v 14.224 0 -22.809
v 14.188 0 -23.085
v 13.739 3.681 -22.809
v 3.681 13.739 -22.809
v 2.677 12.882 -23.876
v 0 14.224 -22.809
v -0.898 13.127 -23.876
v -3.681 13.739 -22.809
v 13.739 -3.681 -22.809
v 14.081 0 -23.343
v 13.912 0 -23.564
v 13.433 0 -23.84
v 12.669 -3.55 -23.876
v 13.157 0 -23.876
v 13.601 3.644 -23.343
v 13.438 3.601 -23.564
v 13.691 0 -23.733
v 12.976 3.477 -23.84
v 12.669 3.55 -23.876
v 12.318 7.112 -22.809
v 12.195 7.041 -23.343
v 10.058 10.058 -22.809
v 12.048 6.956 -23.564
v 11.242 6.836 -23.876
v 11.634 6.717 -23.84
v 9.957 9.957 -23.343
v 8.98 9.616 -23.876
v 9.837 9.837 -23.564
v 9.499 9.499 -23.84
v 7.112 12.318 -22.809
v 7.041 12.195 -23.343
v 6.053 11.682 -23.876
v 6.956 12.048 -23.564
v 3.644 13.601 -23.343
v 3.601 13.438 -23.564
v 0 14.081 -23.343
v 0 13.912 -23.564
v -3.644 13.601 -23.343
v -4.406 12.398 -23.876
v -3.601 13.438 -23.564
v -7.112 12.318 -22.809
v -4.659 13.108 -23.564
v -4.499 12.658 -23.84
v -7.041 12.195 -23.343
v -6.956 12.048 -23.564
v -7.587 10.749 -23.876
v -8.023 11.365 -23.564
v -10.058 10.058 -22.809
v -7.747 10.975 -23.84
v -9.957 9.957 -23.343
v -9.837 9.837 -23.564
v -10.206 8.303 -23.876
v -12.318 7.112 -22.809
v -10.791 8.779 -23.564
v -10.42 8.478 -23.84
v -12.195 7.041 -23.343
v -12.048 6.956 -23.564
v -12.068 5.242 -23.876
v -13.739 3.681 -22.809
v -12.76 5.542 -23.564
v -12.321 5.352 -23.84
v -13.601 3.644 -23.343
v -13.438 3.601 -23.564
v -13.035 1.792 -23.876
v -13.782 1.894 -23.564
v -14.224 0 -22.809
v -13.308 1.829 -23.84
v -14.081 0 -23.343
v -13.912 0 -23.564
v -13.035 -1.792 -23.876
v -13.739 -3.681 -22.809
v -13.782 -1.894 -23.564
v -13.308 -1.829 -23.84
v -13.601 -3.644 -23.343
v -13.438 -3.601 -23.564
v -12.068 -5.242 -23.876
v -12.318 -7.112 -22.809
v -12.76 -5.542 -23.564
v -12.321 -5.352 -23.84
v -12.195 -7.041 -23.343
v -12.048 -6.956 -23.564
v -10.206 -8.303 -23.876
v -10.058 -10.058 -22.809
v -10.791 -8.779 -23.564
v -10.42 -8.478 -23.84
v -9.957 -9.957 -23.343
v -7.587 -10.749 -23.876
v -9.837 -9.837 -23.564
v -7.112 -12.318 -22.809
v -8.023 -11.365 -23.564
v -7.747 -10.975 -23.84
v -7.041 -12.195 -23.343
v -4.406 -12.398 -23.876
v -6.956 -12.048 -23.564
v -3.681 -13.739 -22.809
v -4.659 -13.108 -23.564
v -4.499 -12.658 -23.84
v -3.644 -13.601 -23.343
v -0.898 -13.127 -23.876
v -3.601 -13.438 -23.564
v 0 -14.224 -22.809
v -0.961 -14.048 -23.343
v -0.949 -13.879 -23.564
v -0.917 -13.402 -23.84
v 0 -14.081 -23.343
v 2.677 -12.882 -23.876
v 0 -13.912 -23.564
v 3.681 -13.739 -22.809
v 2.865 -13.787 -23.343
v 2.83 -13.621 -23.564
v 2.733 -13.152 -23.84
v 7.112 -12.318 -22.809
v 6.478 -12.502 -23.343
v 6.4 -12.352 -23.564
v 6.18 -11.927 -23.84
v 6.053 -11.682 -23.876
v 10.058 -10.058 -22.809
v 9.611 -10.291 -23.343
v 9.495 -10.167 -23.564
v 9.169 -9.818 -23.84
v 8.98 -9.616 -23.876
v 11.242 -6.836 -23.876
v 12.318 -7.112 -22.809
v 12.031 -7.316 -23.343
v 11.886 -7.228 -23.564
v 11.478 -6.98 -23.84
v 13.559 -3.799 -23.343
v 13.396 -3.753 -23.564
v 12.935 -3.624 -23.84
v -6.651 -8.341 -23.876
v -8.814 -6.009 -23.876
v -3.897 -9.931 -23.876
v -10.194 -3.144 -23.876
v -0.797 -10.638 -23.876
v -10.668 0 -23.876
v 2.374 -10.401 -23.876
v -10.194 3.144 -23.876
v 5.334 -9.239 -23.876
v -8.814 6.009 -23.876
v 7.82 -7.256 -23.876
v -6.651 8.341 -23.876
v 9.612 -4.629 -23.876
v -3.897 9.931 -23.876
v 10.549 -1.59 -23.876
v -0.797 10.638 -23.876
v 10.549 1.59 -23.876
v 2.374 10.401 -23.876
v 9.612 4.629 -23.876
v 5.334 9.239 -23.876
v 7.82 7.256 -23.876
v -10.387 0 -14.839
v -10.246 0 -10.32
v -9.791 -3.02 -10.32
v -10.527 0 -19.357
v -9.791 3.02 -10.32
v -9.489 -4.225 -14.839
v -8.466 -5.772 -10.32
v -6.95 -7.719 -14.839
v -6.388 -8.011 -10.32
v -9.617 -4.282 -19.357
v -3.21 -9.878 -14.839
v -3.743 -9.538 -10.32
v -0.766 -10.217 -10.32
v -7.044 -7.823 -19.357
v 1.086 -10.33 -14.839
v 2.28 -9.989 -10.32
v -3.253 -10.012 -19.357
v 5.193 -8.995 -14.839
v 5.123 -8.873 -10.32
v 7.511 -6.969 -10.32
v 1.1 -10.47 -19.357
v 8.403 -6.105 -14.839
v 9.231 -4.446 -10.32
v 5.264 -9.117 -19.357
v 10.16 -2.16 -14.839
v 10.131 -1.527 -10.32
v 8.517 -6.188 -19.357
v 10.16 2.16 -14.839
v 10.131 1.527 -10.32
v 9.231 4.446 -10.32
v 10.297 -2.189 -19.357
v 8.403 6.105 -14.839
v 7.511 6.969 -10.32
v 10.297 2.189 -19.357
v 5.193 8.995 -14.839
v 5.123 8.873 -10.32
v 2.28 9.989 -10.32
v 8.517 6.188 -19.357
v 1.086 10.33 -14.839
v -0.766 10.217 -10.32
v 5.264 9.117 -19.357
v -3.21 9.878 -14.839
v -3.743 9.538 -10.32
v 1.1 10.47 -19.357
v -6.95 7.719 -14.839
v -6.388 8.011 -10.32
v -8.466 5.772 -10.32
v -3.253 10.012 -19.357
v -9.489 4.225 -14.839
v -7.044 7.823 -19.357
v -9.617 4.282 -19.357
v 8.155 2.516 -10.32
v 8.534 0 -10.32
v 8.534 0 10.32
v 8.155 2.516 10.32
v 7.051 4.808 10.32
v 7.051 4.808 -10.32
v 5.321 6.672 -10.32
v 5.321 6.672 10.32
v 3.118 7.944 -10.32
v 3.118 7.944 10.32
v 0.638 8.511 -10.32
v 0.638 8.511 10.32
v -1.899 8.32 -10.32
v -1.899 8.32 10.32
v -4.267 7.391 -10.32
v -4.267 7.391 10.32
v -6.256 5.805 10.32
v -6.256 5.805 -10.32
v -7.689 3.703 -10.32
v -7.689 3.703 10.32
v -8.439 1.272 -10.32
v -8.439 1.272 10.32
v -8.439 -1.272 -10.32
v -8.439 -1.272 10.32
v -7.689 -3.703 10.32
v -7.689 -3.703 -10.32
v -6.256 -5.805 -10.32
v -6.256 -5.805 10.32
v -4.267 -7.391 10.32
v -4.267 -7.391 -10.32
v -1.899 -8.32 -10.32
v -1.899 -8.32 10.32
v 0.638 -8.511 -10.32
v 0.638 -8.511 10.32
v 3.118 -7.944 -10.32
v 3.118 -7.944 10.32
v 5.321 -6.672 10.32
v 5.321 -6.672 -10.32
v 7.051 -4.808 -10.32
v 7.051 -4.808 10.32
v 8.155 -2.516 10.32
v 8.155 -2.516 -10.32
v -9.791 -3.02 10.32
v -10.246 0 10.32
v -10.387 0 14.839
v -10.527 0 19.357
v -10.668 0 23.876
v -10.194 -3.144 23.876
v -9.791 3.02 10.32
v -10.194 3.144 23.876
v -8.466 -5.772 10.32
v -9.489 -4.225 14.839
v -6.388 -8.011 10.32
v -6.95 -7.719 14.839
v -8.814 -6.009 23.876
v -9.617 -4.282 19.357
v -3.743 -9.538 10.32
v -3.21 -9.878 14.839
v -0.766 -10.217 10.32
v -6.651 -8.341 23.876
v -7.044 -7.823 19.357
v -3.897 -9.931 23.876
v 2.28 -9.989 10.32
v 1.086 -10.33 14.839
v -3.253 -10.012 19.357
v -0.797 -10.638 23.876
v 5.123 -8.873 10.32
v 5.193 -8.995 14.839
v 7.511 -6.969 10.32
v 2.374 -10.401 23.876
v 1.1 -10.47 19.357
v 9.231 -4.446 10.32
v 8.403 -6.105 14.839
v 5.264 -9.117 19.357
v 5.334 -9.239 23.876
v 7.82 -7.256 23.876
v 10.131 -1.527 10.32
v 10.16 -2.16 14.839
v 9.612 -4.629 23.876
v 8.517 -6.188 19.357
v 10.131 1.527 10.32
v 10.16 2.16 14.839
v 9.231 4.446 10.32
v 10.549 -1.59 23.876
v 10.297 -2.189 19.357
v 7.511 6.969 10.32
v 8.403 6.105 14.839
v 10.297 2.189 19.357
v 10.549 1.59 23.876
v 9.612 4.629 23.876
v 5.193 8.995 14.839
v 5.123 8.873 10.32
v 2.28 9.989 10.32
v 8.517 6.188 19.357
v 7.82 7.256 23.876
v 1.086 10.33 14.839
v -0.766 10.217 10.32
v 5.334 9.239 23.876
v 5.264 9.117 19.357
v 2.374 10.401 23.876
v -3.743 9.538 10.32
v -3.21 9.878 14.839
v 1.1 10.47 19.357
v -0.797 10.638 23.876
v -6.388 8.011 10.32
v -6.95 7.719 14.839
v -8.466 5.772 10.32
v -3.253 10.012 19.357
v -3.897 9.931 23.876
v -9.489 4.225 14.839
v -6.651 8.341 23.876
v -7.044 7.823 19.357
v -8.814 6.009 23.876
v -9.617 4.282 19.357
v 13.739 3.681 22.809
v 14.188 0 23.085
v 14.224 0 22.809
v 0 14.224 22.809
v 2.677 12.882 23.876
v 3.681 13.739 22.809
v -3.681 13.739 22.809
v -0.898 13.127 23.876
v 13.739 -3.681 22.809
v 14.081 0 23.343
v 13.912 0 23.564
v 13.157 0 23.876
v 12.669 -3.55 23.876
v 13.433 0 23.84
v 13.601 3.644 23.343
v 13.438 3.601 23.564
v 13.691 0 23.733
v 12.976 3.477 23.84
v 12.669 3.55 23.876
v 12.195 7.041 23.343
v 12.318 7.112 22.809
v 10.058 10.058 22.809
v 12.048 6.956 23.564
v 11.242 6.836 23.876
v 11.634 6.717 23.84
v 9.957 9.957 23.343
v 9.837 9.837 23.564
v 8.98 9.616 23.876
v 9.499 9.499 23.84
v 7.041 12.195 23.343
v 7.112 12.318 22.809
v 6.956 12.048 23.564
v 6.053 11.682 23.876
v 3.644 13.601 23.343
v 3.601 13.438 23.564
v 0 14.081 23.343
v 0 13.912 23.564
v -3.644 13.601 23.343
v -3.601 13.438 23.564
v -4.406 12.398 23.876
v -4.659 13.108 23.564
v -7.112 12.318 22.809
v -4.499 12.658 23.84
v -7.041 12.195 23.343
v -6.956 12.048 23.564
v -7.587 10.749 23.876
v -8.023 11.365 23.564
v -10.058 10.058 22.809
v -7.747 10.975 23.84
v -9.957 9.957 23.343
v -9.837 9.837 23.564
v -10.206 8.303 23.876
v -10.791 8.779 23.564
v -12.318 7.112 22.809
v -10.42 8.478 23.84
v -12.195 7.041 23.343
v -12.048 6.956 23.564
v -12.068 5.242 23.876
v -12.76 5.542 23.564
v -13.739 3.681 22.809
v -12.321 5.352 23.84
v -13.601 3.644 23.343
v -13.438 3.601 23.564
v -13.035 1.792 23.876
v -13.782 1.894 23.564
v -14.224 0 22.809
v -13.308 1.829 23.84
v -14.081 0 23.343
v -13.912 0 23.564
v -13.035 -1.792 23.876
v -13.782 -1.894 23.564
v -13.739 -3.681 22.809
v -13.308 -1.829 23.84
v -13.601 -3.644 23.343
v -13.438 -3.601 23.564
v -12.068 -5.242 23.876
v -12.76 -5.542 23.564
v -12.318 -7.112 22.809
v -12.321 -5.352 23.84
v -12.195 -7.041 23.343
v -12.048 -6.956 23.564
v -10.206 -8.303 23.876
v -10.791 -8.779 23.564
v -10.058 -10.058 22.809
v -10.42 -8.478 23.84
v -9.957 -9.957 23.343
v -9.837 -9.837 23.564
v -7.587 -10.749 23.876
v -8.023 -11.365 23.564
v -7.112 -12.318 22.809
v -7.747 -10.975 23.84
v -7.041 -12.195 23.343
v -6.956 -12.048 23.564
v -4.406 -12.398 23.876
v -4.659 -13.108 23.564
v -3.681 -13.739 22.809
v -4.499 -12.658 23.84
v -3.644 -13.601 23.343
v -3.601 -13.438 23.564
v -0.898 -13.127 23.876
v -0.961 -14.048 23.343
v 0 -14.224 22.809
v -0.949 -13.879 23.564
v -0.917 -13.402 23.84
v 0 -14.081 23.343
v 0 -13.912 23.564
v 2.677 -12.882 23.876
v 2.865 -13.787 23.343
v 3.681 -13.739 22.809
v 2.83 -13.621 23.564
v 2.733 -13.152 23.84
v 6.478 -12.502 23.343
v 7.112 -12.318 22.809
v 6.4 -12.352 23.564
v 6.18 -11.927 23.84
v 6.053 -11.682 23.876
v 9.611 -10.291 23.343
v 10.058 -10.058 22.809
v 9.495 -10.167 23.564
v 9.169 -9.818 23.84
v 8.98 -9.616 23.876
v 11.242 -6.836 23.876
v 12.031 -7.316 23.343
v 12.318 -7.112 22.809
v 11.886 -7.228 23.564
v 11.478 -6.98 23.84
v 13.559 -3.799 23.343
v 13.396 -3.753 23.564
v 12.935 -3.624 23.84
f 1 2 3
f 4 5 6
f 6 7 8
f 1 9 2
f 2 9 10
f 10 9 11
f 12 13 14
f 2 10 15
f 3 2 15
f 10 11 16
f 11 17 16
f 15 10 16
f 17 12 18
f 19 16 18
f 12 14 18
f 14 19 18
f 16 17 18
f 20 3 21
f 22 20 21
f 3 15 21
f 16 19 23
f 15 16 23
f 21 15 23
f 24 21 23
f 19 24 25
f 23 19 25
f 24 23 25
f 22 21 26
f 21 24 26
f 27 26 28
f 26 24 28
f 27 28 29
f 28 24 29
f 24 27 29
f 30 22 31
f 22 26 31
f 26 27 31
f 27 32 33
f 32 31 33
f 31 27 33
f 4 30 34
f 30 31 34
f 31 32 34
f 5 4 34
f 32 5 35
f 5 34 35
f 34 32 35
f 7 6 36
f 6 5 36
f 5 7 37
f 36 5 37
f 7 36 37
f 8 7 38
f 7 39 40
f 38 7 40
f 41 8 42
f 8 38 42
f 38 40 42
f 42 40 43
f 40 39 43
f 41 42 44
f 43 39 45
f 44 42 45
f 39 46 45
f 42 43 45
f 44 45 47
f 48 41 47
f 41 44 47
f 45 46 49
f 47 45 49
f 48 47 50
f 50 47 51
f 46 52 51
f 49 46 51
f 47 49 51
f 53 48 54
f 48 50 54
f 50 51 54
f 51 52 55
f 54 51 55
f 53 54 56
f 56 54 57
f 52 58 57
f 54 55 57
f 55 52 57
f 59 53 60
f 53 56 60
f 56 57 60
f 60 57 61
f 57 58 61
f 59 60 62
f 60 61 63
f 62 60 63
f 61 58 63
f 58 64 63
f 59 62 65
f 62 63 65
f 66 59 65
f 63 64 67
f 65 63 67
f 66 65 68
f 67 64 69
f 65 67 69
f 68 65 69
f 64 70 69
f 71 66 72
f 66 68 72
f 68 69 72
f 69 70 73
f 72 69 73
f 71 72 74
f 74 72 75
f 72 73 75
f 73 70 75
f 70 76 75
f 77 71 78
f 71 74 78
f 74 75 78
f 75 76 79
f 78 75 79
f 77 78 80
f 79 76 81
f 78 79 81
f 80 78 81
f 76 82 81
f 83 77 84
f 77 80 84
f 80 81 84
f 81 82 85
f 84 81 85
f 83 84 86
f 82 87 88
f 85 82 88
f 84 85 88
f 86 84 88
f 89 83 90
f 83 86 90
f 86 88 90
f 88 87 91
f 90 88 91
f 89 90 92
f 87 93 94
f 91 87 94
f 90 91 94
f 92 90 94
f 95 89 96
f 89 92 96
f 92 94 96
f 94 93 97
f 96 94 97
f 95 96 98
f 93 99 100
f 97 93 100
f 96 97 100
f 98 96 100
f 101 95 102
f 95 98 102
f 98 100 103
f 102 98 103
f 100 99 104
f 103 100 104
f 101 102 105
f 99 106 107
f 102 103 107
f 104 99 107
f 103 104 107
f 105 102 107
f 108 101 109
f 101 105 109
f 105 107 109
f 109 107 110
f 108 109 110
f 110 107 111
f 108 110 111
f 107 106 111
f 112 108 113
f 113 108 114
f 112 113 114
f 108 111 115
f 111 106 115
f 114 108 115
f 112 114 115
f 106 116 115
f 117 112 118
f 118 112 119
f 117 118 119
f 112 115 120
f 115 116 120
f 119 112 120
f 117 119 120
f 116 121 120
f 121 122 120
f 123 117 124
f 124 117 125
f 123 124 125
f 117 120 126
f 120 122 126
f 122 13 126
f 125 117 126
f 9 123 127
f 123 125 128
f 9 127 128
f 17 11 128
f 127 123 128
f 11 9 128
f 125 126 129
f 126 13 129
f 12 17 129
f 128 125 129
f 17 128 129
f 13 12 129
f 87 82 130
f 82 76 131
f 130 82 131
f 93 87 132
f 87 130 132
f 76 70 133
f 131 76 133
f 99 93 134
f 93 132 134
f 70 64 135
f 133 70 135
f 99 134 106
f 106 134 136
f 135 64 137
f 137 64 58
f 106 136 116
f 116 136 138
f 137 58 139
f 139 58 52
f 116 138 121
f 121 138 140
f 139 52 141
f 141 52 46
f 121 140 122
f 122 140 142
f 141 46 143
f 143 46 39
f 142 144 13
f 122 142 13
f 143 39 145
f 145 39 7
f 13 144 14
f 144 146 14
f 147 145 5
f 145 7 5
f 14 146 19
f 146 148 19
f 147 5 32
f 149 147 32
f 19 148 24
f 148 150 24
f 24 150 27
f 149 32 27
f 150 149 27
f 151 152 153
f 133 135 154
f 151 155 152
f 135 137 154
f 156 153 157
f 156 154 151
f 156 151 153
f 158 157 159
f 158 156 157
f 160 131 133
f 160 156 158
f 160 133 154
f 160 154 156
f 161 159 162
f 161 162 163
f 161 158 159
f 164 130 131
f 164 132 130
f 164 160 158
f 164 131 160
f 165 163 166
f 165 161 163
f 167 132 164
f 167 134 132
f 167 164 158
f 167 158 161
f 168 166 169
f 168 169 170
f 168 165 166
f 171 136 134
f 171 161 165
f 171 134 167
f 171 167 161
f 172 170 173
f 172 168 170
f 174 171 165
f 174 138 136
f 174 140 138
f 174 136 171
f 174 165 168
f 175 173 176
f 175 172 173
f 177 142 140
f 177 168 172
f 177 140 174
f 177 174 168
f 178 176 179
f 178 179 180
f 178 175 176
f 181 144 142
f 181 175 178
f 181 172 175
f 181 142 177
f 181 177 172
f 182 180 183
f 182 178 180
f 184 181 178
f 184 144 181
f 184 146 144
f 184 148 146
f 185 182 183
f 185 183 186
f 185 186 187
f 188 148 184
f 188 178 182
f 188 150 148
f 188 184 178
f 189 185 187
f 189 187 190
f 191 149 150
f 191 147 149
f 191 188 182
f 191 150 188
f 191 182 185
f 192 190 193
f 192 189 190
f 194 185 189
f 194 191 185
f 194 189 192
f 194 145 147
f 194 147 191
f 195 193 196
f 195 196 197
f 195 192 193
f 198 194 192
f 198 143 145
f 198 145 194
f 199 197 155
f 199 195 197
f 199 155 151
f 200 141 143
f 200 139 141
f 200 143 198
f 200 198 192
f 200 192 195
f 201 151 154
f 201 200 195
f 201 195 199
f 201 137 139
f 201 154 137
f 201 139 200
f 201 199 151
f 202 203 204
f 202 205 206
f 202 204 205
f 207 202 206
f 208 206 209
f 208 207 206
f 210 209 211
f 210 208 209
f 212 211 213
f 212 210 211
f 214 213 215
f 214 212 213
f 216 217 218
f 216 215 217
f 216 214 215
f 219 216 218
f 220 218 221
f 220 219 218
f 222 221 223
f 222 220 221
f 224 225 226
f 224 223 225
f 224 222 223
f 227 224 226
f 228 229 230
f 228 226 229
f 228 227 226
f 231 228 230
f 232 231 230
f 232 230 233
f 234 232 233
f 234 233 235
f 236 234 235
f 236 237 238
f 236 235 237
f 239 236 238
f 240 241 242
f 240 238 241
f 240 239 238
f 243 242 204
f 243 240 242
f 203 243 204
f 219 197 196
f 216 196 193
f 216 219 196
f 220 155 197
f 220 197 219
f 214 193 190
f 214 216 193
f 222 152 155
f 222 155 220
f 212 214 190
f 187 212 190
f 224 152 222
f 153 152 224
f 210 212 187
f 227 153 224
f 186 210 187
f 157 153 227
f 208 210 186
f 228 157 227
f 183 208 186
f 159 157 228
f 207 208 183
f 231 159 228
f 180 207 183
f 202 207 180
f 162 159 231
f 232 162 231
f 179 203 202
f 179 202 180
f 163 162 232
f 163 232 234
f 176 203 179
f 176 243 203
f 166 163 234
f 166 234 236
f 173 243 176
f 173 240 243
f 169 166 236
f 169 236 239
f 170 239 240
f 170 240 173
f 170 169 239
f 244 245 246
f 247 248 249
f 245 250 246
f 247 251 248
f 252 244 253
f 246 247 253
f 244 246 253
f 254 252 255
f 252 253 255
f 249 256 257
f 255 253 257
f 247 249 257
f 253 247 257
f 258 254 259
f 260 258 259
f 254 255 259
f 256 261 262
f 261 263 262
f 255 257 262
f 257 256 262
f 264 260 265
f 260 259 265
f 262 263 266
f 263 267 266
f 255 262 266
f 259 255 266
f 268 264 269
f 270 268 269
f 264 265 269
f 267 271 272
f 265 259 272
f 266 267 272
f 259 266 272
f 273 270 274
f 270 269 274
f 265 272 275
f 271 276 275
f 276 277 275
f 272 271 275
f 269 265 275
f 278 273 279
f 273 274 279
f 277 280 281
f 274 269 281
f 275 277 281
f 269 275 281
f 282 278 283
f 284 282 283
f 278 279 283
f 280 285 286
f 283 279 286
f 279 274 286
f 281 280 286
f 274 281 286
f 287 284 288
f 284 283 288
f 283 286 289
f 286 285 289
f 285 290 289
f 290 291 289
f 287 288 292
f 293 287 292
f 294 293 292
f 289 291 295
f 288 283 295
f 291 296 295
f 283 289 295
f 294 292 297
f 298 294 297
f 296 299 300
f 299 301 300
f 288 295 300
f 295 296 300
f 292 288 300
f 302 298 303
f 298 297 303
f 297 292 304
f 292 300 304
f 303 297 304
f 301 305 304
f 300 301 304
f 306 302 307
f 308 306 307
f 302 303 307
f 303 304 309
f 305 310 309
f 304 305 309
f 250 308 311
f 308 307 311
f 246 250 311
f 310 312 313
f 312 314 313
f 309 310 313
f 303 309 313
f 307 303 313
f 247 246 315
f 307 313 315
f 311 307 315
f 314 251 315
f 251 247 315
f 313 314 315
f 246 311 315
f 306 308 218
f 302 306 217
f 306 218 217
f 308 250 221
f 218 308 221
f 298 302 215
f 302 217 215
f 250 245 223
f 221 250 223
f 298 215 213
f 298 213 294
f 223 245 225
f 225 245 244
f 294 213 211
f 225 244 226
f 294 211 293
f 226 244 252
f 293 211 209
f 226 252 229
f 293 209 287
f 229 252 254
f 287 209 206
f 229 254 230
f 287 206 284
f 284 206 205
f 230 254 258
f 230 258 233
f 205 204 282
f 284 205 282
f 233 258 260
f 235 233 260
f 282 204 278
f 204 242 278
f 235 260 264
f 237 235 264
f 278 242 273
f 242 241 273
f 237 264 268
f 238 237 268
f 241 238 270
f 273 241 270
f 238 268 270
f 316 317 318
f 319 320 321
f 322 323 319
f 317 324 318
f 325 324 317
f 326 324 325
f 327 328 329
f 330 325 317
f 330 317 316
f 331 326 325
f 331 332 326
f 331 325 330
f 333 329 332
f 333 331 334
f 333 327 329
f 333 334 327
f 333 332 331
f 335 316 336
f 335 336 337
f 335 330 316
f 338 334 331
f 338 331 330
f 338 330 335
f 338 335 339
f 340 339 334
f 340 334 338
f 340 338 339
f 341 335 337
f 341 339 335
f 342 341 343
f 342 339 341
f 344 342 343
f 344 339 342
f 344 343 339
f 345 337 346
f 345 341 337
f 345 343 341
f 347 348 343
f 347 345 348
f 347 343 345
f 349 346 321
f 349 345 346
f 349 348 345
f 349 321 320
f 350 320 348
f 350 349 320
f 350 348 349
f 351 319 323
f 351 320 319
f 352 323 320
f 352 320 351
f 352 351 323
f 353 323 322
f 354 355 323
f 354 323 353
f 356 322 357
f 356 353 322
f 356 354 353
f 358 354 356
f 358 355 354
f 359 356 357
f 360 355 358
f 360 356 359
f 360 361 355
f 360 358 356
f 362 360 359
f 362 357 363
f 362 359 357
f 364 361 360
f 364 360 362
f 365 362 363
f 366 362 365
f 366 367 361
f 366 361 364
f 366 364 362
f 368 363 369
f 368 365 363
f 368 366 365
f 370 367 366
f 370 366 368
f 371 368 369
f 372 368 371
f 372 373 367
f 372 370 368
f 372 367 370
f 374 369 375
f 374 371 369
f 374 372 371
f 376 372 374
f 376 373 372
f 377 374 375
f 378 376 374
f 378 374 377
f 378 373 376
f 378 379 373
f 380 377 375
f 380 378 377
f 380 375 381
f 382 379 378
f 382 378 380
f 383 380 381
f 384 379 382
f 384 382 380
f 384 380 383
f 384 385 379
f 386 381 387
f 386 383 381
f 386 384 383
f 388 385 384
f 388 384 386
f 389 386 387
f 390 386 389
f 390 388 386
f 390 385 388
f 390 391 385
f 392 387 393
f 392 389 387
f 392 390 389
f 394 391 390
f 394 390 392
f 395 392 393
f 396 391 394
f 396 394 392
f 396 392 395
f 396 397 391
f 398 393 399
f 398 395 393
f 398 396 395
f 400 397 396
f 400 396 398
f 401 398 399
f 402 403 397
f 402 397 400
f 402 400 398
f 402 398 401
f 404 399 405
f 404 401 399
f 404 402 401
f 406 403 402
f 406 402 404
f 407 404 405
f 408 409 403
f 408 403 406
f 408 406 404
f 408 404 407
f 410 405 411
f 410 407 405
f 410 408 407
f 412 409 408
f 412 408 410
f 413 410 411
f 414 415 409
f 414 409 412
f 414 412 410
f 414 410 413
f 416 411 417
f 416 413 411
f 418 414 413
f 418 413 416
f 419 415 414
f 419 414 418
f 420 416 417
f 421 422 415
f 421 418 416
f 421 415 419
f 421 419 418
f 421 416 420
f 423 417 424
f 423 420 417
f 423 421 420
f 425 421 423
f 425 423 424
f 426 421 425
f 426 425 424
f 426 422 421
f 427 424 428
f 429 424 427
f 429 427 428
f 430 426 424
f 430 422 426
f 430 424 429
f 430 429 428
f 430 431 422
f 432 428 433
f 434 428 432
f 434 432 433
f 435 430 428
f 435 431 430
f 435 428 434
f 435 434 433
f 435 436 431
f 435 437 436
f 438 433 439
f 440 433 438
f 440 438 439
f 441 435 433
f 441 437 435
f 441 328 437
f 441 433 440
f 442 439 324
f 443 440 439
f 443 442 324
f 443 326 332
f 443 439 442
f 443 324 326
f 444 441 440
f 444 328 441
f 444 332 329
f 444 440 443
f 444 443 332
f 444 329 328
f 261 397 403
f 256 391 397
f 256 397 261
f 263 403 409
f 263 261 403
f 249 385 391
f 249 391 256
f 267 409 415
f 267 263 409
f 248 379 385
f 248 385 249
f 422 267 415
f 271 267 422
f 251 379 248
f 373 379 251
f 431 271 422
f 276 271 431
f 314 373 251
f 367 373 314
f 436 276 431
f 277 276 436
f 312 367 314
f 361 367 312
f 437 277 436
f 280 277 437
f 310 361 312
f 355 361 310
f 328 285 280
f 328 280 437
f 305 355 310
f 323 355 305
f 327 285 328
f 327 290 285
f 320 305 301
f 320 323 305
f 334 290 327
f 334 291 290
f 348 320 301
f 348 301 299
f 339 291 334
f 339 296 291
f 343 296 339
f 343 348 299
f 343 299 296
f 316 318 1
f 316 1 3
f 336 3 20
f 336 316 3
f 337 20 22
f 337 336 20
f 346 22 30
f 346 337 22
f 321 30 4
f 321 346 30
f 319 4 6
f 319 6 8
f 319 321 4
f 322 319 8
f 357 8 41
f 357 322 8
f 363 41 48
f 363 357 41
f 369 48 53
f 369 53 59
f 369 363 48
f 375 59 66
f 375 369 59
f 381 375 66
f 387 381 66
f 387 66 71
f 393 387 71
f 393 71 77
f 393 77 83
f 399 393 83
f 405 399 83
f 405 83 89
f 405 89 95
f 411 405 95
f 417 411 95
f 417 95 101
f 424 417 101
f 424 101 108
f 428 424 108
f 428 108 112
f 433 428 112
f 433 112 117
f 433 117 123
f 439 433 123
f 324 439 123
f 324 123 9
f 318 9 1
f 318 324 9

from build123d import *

# Parameters (mm, degrees)
BODYSCH_R  = 14.224
BODY_DEPTH = 23.876
FLOWSCH_R  = 8.5344
FLOW_DEPTH = 47.752
FILLET1_R  = 1.0668


with BuildPart() as part:
    # BodySch → Body (new, symmetric)
    with BuildSketch(Plane.XY):
        Circle(BODYSCH_R)
    extrude(amount=BODY_DEPTH, both=True)

    # FlowSch → Flow (cut)
    with BuildSketch(Plane.XY.offset(-23.876)):
        Circle(FLOWSCH_R)
    extrude(amount=FLOW_DEPTH, mode=Mode.SUBTRACT)

    # ThreadSch → Thread (revolve, cut)
    with BuildSketch(Plane(origin=(0, 0, 0), x_dir=(0, 0, -1), z_dir=(1, 0, 0)), mode=Mode.PRIVATE) as thread_sk:
        Polygon((-10.32002, 0), (-10.32002, 10.245933299), (-23.876, 10.668), (-23.876, 0), align=None)
    thread = revolve(thread_sk.sketch.rotate(Axis((0, 0, 0), (0, 0, 1)), 90), axis=Axis((0, 0, 0), (0, 0, 1)), mode=Mode.SUBTRACT)

    # Fillet1
    fillet1_edges = [part.edges().sort_by_distance(p)[0] for p in [
        (-14.224, 0, -23.876),
        (-14.224, 0, 23.876),
    ]]
    fillet(fillet1_edges, radius=FILLET1_R)

    # Mirror1: Thread across plane
    add(thread.mirror(Plane.XY), mode=Mode.SUBTRACT)


solid = part.part
